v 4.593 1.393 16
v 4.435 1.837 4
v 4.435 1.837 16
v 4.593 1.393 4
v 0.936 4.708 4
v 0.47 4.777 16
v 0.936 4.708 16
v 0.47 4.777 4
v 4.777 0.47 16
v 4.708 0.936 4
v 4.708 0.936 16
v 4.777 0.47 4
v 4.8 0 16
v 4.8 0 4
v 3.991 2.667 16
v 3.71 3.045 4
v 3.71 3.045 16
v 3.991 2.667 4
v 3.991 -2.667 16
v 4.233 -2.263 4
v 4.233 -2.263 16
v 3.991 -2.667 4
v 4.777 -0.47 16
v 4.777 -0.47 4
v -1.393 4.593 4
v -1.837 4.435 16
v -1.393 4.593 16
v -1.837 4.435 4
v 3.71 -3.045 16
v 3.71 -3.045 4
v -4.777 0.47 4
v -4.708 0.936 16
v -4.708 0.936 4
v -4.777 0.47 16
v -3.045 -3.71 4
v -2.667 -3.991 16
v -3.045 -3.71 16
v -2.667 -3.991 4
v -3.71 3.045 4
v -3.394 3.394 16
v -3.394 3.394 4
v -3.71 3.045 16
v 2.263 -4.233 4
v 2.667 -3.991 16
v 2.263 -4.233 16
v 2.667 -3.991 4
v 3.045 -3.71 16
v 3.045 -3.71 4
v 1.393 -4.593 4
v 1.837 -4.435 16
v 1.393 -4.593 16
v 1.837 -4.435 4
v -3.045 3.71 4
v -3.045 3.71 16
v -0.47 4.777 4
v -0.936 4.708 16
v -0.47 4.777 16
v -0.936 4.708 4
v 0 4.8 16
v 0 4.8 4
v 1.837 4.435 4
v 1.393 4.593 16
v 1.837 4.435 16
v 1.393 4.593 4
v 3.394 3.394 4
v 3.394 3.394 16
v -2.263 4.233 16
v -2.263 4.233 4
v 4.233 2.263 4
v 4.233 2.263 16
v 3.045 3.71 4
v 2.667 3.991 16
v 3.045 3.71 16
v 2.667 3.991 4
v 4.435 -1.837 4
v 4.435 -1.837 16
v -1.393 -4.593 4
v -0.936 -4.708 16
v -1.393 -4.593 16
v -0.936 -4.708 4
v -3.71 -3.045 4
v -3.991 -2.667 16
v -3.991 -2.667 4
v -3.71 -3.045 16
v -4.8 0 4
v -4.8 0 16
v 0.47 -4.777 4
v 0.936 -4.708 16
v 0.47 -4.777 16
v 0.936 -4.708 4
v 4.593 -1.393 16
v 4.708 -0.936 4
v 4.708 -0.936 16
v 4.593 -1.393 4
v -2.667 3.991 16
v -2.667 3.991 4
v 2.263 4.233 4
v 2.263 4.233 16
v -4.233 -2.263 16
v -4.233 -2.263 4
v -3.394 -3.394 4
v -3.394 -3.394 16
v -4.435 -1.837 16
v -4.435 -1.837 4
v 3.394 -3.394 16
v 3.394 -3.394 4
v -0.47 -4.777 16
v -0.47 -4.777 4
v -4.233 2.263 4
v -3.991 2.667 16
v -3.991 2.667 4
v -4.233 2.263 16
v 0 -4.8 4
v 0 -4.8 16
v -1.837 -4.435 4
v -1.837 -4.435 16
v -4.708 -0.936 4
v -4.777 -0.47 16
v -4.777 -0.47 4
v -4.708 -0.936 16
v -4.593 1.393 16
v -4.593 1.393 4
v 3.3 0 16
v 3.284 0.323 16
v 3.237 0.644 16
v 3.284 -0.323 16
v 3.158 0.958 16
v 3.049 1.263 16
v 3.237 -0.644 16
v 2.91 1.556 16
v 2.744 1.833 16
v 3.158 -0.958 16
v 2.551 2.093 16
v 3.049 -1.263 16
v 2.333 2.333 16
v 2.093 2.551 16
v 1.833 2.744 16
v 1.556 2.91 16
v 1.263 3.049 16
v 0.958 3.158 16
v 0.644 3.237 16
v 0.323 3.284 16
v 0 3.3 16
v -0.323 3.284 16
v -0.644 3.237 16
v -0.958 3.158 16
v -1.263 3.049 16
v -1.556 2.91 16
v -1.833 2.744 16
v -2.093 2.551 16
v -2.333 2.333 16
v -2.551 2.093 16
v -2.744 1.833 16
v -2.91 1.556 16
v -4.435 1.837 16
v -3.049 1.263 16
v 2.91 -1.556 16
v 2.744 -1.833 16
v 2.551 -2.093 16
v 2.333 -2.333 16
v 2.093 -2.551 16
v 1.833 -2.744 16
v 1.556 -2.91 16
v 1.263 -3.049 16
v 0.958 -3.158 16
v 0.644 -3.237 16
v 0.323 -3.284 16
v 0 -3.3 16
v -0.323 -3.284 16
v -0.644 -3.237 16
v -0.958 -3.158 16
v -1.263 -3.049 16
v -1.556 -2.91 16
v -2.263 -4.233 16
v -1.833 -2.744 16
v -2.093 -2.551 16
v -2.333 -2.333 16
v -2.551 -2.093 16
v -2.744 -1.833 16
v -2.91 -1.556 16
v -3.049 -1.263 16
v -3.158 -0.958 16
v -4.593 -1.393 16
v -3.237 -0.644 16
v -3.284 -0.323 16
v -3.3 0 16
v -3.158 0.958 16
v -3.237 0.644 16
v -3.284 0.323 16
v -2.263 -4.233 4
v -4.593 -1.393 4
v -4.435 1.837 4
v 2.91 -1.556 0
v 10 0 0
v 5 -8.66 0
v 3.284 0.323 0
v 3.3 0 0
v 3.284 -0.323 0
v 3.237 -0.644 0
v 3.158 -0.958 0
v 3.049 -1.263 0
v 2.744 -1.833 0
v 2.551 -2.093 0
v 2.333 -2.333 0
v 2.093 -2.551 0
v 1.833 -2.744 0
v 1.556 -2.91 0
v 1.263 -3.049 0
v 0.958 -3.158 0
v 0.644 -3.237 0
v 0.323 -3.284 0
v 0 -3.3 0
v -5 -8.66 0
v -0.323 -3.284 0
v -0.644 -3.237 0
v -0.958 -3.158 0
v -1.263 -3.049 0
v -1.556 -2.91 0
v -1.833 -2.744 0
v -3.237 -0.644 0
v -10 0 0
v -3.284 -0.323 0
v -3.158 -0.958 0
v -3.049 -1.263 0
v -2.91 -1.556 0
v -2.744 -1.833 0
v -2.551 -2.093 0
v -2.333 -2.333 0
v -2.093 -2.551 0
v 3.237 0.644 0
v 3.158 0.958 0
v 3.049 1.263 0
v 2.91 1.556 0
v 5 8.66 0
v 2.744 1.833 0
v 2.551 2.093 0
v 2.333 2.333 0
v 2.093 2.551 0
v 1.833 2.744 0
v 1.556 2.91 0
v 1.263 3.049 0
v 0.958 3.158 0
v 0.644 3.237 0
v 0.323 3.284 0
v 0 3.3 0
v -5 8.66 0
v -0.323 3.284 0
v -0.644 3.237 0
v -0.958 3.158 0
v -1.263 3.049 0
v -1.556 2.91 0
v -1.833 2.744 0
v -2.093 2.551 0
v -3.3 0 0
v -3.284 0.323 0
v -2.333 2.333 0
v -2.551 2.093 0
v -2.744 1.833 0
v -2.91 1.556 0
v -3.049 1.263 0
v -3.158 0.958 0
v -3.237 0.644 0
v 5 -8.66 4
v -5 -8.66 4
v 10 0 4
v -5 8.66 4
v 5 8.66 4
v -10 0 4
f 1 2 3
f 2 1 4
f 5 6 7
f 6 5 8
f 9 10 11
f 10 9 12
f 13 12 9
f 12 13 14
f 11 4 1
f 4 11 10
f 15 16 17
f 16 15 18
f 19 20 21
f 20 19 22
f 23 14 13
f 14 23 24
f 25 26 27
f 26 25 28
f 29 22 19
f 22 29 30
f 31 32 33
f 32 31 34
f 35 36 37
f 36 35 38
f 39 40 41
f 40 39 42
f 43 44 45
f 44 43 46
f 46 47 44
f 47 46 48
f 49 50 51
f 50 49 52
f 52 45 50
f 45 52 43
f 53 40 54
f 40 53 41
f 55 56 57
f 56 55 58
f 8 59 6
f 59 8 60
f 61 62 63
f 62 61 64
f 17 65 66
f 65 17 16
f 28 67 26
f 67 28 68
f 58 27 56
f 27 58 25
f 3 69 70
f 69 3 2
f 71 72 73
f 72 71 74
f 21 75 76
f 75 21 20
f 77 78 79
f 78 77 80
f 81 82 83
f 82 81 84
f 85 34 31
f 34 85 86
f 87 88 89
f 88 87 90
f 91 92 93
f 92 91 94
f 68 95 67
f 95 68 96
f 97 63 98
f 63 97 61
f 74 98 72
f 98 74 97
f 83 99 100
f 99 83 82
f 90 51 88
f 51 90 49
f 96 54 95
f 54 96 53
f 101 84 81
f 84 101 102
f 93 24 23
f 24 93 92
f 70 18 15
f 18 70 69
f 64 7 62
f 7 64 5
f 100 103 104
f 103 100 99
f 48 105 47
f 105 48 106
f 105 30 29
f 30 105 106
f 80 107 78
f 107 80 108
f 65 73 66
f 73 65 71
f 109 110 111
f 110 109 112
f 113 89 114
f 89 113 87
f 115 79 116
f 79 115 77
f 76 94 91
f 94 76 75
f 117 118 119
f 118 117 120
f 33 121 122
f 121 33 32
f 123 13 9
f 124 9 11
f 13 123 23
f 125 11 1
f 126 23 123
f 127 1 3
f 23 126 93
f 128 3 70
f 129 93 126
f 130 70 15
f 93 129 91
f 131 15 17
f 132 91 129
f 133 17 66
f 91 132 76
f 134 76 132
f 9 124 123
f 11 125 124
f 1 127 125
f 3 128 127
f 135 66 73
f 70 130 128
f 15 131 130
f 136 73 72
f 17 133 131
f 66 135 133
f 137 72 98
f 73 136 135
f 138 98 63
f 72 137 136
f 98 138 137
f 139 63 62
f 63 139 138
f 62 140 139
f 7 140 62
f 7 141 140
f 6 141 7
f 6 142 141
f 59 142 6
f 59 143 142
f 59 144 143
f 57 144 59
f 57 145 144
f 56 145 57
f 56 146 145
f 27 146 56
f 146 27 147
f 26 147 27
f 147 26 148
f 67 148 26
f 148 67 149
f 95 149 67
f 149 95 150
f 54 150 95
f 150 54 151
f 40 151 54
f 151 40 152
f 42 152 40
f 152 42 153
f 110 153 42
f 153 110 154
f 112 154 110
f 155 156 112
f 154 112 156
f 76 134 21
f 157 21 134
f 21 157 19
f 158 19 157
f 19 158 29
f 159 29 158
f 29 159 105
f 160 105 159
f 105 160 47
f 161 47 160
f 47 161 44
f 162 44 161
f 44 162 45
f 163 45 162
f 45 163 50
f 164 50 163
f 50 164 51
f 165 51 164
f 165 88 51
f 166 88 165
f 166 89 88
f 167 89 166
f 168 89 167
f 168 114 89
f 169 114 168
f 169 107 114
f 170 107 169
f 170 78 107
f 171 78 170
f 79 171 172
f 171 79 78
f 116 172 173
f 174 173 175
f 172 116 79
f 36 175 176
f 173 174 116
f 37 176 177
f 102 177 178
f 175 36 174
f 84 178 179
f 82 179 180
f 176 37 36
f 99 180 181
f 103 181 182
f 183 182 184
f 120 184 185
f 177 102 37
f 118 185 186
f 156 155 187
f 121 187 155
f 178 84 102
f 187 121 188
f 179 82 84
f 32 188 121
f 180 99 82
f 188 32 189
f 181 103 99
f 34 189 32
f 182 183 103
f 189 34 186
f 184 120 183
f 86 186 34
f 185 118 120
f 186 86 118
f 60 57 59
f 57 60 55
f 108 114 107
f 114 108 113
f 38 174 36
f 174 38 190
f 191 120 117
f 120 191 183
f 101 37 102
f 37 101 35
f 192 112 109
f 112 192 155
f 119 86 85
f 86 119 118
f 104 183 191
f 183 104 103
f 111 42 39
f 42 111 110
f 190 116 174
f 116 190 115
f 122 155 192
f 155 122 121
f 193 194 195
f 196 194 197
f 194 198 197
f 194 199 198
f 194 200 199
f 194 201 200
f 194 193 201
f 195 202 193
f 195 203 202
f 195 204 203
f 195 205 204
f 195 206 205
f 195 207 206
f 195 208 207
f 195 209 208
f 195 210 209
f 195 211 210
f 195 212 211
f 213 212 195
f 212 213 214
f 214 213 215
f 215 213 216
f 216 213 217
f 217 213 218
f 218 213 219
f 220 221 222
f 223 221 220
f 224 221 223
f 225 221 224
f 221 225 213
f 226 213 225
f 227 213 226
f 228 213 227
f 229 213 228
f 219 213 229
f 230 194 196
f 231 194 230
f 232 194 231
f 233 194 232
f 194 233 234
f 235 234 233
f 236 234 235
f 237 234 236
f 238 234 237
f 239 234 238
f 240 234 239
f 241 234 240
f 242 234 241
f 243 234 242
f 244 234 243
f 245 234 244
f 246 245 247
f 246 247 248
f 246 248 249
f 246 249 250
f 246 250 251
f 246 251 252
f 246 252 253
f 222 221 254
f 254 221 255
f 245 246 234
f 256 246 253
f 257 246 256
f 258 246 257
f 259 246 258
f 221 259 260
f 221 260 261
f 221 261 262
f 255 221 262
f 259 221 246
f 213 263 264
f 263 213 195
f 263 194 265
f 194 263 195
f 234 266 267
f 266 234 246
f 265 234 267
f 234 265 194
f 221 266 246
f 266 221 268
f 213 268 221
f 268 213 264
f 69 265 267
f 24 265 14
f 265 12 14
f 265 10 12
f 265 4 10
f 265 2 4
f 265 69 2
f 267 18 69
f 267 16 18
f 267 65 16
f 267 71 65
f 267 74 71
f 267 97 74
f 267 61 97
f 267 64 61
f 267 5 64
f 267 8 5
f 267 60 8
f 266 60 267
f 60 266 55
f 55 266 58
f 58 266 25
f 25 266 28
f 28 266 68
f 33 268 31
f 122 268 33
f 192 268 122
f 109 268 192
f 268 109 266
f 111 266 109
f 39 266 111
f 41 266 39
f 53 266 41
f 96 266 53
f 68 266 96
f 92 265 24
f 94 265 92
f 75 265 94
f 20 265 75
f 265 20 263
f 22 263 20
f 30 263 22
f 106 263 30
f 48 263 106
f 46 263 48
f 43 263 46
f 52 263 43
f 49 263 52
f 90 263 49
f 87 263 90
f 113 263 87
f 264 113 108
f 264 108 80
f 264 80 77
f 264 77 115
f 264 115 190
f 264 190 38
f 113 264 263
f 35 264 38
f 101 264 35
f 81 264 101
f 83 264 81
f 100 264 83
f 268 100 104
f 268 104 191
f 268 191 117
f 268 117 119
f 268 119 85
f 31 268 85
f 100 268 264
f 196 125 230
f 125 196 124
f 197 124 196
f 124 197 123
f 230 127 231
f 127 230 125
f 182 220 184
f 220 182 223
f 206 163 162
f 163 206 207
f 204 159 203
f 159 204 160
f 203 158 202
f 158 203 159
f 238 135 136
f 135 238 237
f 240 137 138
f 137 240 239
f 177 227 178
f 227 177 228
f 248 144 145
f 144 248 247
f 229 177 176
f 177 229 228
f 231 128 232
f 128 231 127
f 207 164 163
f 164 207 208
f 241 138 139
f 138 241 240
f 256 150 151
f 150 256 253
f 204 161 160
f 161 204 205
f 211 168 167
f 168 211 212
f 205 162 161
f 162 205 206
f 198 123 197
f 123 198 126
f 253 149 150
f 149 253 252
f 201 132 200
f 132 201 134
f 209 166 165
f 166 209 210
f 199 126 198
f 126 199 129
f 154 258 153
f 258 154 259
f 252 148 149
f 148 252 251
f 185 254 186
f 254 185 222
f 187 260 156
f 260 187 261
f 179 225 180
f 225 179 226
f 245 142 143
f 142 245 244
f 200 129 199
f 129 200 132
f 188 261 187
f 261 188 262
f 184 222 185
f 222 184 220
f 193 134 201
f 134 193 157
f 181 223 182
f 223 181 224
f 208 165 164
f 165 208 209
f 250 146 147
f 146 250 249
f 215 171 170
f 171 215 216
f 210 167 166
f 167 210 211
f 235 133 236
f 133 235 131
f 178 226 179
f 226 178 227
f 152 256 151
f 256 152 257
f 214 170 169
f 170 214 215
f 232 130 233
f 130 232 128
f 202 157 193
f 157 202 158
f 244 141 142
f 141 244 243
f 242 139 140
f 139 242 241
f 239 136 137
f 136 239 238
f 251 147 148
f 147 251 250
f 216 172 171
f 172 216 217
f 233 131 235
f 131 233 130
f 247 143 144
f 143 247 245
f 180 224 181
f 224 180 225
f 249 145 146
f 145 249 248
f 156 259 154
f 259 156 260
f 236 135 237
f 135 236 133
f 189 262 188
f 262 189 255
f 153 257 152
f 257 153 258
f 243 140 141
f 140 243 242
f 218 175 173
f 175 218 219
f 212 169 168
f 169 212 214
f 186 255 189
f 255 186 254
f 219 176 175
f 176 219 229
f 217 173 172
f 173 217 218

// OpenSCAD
$fn=64;


d0 = 6.6;
d1 = 9.6;
d2 = 20;
h1 = 4;
h2 = 16;

difference() {
  union() {
    cylinder(h=h2, d=d1);
    cylinder(h=h1, d=d2, $fn=6);
  }

  cylinder(h=h2, d=d0);
}
